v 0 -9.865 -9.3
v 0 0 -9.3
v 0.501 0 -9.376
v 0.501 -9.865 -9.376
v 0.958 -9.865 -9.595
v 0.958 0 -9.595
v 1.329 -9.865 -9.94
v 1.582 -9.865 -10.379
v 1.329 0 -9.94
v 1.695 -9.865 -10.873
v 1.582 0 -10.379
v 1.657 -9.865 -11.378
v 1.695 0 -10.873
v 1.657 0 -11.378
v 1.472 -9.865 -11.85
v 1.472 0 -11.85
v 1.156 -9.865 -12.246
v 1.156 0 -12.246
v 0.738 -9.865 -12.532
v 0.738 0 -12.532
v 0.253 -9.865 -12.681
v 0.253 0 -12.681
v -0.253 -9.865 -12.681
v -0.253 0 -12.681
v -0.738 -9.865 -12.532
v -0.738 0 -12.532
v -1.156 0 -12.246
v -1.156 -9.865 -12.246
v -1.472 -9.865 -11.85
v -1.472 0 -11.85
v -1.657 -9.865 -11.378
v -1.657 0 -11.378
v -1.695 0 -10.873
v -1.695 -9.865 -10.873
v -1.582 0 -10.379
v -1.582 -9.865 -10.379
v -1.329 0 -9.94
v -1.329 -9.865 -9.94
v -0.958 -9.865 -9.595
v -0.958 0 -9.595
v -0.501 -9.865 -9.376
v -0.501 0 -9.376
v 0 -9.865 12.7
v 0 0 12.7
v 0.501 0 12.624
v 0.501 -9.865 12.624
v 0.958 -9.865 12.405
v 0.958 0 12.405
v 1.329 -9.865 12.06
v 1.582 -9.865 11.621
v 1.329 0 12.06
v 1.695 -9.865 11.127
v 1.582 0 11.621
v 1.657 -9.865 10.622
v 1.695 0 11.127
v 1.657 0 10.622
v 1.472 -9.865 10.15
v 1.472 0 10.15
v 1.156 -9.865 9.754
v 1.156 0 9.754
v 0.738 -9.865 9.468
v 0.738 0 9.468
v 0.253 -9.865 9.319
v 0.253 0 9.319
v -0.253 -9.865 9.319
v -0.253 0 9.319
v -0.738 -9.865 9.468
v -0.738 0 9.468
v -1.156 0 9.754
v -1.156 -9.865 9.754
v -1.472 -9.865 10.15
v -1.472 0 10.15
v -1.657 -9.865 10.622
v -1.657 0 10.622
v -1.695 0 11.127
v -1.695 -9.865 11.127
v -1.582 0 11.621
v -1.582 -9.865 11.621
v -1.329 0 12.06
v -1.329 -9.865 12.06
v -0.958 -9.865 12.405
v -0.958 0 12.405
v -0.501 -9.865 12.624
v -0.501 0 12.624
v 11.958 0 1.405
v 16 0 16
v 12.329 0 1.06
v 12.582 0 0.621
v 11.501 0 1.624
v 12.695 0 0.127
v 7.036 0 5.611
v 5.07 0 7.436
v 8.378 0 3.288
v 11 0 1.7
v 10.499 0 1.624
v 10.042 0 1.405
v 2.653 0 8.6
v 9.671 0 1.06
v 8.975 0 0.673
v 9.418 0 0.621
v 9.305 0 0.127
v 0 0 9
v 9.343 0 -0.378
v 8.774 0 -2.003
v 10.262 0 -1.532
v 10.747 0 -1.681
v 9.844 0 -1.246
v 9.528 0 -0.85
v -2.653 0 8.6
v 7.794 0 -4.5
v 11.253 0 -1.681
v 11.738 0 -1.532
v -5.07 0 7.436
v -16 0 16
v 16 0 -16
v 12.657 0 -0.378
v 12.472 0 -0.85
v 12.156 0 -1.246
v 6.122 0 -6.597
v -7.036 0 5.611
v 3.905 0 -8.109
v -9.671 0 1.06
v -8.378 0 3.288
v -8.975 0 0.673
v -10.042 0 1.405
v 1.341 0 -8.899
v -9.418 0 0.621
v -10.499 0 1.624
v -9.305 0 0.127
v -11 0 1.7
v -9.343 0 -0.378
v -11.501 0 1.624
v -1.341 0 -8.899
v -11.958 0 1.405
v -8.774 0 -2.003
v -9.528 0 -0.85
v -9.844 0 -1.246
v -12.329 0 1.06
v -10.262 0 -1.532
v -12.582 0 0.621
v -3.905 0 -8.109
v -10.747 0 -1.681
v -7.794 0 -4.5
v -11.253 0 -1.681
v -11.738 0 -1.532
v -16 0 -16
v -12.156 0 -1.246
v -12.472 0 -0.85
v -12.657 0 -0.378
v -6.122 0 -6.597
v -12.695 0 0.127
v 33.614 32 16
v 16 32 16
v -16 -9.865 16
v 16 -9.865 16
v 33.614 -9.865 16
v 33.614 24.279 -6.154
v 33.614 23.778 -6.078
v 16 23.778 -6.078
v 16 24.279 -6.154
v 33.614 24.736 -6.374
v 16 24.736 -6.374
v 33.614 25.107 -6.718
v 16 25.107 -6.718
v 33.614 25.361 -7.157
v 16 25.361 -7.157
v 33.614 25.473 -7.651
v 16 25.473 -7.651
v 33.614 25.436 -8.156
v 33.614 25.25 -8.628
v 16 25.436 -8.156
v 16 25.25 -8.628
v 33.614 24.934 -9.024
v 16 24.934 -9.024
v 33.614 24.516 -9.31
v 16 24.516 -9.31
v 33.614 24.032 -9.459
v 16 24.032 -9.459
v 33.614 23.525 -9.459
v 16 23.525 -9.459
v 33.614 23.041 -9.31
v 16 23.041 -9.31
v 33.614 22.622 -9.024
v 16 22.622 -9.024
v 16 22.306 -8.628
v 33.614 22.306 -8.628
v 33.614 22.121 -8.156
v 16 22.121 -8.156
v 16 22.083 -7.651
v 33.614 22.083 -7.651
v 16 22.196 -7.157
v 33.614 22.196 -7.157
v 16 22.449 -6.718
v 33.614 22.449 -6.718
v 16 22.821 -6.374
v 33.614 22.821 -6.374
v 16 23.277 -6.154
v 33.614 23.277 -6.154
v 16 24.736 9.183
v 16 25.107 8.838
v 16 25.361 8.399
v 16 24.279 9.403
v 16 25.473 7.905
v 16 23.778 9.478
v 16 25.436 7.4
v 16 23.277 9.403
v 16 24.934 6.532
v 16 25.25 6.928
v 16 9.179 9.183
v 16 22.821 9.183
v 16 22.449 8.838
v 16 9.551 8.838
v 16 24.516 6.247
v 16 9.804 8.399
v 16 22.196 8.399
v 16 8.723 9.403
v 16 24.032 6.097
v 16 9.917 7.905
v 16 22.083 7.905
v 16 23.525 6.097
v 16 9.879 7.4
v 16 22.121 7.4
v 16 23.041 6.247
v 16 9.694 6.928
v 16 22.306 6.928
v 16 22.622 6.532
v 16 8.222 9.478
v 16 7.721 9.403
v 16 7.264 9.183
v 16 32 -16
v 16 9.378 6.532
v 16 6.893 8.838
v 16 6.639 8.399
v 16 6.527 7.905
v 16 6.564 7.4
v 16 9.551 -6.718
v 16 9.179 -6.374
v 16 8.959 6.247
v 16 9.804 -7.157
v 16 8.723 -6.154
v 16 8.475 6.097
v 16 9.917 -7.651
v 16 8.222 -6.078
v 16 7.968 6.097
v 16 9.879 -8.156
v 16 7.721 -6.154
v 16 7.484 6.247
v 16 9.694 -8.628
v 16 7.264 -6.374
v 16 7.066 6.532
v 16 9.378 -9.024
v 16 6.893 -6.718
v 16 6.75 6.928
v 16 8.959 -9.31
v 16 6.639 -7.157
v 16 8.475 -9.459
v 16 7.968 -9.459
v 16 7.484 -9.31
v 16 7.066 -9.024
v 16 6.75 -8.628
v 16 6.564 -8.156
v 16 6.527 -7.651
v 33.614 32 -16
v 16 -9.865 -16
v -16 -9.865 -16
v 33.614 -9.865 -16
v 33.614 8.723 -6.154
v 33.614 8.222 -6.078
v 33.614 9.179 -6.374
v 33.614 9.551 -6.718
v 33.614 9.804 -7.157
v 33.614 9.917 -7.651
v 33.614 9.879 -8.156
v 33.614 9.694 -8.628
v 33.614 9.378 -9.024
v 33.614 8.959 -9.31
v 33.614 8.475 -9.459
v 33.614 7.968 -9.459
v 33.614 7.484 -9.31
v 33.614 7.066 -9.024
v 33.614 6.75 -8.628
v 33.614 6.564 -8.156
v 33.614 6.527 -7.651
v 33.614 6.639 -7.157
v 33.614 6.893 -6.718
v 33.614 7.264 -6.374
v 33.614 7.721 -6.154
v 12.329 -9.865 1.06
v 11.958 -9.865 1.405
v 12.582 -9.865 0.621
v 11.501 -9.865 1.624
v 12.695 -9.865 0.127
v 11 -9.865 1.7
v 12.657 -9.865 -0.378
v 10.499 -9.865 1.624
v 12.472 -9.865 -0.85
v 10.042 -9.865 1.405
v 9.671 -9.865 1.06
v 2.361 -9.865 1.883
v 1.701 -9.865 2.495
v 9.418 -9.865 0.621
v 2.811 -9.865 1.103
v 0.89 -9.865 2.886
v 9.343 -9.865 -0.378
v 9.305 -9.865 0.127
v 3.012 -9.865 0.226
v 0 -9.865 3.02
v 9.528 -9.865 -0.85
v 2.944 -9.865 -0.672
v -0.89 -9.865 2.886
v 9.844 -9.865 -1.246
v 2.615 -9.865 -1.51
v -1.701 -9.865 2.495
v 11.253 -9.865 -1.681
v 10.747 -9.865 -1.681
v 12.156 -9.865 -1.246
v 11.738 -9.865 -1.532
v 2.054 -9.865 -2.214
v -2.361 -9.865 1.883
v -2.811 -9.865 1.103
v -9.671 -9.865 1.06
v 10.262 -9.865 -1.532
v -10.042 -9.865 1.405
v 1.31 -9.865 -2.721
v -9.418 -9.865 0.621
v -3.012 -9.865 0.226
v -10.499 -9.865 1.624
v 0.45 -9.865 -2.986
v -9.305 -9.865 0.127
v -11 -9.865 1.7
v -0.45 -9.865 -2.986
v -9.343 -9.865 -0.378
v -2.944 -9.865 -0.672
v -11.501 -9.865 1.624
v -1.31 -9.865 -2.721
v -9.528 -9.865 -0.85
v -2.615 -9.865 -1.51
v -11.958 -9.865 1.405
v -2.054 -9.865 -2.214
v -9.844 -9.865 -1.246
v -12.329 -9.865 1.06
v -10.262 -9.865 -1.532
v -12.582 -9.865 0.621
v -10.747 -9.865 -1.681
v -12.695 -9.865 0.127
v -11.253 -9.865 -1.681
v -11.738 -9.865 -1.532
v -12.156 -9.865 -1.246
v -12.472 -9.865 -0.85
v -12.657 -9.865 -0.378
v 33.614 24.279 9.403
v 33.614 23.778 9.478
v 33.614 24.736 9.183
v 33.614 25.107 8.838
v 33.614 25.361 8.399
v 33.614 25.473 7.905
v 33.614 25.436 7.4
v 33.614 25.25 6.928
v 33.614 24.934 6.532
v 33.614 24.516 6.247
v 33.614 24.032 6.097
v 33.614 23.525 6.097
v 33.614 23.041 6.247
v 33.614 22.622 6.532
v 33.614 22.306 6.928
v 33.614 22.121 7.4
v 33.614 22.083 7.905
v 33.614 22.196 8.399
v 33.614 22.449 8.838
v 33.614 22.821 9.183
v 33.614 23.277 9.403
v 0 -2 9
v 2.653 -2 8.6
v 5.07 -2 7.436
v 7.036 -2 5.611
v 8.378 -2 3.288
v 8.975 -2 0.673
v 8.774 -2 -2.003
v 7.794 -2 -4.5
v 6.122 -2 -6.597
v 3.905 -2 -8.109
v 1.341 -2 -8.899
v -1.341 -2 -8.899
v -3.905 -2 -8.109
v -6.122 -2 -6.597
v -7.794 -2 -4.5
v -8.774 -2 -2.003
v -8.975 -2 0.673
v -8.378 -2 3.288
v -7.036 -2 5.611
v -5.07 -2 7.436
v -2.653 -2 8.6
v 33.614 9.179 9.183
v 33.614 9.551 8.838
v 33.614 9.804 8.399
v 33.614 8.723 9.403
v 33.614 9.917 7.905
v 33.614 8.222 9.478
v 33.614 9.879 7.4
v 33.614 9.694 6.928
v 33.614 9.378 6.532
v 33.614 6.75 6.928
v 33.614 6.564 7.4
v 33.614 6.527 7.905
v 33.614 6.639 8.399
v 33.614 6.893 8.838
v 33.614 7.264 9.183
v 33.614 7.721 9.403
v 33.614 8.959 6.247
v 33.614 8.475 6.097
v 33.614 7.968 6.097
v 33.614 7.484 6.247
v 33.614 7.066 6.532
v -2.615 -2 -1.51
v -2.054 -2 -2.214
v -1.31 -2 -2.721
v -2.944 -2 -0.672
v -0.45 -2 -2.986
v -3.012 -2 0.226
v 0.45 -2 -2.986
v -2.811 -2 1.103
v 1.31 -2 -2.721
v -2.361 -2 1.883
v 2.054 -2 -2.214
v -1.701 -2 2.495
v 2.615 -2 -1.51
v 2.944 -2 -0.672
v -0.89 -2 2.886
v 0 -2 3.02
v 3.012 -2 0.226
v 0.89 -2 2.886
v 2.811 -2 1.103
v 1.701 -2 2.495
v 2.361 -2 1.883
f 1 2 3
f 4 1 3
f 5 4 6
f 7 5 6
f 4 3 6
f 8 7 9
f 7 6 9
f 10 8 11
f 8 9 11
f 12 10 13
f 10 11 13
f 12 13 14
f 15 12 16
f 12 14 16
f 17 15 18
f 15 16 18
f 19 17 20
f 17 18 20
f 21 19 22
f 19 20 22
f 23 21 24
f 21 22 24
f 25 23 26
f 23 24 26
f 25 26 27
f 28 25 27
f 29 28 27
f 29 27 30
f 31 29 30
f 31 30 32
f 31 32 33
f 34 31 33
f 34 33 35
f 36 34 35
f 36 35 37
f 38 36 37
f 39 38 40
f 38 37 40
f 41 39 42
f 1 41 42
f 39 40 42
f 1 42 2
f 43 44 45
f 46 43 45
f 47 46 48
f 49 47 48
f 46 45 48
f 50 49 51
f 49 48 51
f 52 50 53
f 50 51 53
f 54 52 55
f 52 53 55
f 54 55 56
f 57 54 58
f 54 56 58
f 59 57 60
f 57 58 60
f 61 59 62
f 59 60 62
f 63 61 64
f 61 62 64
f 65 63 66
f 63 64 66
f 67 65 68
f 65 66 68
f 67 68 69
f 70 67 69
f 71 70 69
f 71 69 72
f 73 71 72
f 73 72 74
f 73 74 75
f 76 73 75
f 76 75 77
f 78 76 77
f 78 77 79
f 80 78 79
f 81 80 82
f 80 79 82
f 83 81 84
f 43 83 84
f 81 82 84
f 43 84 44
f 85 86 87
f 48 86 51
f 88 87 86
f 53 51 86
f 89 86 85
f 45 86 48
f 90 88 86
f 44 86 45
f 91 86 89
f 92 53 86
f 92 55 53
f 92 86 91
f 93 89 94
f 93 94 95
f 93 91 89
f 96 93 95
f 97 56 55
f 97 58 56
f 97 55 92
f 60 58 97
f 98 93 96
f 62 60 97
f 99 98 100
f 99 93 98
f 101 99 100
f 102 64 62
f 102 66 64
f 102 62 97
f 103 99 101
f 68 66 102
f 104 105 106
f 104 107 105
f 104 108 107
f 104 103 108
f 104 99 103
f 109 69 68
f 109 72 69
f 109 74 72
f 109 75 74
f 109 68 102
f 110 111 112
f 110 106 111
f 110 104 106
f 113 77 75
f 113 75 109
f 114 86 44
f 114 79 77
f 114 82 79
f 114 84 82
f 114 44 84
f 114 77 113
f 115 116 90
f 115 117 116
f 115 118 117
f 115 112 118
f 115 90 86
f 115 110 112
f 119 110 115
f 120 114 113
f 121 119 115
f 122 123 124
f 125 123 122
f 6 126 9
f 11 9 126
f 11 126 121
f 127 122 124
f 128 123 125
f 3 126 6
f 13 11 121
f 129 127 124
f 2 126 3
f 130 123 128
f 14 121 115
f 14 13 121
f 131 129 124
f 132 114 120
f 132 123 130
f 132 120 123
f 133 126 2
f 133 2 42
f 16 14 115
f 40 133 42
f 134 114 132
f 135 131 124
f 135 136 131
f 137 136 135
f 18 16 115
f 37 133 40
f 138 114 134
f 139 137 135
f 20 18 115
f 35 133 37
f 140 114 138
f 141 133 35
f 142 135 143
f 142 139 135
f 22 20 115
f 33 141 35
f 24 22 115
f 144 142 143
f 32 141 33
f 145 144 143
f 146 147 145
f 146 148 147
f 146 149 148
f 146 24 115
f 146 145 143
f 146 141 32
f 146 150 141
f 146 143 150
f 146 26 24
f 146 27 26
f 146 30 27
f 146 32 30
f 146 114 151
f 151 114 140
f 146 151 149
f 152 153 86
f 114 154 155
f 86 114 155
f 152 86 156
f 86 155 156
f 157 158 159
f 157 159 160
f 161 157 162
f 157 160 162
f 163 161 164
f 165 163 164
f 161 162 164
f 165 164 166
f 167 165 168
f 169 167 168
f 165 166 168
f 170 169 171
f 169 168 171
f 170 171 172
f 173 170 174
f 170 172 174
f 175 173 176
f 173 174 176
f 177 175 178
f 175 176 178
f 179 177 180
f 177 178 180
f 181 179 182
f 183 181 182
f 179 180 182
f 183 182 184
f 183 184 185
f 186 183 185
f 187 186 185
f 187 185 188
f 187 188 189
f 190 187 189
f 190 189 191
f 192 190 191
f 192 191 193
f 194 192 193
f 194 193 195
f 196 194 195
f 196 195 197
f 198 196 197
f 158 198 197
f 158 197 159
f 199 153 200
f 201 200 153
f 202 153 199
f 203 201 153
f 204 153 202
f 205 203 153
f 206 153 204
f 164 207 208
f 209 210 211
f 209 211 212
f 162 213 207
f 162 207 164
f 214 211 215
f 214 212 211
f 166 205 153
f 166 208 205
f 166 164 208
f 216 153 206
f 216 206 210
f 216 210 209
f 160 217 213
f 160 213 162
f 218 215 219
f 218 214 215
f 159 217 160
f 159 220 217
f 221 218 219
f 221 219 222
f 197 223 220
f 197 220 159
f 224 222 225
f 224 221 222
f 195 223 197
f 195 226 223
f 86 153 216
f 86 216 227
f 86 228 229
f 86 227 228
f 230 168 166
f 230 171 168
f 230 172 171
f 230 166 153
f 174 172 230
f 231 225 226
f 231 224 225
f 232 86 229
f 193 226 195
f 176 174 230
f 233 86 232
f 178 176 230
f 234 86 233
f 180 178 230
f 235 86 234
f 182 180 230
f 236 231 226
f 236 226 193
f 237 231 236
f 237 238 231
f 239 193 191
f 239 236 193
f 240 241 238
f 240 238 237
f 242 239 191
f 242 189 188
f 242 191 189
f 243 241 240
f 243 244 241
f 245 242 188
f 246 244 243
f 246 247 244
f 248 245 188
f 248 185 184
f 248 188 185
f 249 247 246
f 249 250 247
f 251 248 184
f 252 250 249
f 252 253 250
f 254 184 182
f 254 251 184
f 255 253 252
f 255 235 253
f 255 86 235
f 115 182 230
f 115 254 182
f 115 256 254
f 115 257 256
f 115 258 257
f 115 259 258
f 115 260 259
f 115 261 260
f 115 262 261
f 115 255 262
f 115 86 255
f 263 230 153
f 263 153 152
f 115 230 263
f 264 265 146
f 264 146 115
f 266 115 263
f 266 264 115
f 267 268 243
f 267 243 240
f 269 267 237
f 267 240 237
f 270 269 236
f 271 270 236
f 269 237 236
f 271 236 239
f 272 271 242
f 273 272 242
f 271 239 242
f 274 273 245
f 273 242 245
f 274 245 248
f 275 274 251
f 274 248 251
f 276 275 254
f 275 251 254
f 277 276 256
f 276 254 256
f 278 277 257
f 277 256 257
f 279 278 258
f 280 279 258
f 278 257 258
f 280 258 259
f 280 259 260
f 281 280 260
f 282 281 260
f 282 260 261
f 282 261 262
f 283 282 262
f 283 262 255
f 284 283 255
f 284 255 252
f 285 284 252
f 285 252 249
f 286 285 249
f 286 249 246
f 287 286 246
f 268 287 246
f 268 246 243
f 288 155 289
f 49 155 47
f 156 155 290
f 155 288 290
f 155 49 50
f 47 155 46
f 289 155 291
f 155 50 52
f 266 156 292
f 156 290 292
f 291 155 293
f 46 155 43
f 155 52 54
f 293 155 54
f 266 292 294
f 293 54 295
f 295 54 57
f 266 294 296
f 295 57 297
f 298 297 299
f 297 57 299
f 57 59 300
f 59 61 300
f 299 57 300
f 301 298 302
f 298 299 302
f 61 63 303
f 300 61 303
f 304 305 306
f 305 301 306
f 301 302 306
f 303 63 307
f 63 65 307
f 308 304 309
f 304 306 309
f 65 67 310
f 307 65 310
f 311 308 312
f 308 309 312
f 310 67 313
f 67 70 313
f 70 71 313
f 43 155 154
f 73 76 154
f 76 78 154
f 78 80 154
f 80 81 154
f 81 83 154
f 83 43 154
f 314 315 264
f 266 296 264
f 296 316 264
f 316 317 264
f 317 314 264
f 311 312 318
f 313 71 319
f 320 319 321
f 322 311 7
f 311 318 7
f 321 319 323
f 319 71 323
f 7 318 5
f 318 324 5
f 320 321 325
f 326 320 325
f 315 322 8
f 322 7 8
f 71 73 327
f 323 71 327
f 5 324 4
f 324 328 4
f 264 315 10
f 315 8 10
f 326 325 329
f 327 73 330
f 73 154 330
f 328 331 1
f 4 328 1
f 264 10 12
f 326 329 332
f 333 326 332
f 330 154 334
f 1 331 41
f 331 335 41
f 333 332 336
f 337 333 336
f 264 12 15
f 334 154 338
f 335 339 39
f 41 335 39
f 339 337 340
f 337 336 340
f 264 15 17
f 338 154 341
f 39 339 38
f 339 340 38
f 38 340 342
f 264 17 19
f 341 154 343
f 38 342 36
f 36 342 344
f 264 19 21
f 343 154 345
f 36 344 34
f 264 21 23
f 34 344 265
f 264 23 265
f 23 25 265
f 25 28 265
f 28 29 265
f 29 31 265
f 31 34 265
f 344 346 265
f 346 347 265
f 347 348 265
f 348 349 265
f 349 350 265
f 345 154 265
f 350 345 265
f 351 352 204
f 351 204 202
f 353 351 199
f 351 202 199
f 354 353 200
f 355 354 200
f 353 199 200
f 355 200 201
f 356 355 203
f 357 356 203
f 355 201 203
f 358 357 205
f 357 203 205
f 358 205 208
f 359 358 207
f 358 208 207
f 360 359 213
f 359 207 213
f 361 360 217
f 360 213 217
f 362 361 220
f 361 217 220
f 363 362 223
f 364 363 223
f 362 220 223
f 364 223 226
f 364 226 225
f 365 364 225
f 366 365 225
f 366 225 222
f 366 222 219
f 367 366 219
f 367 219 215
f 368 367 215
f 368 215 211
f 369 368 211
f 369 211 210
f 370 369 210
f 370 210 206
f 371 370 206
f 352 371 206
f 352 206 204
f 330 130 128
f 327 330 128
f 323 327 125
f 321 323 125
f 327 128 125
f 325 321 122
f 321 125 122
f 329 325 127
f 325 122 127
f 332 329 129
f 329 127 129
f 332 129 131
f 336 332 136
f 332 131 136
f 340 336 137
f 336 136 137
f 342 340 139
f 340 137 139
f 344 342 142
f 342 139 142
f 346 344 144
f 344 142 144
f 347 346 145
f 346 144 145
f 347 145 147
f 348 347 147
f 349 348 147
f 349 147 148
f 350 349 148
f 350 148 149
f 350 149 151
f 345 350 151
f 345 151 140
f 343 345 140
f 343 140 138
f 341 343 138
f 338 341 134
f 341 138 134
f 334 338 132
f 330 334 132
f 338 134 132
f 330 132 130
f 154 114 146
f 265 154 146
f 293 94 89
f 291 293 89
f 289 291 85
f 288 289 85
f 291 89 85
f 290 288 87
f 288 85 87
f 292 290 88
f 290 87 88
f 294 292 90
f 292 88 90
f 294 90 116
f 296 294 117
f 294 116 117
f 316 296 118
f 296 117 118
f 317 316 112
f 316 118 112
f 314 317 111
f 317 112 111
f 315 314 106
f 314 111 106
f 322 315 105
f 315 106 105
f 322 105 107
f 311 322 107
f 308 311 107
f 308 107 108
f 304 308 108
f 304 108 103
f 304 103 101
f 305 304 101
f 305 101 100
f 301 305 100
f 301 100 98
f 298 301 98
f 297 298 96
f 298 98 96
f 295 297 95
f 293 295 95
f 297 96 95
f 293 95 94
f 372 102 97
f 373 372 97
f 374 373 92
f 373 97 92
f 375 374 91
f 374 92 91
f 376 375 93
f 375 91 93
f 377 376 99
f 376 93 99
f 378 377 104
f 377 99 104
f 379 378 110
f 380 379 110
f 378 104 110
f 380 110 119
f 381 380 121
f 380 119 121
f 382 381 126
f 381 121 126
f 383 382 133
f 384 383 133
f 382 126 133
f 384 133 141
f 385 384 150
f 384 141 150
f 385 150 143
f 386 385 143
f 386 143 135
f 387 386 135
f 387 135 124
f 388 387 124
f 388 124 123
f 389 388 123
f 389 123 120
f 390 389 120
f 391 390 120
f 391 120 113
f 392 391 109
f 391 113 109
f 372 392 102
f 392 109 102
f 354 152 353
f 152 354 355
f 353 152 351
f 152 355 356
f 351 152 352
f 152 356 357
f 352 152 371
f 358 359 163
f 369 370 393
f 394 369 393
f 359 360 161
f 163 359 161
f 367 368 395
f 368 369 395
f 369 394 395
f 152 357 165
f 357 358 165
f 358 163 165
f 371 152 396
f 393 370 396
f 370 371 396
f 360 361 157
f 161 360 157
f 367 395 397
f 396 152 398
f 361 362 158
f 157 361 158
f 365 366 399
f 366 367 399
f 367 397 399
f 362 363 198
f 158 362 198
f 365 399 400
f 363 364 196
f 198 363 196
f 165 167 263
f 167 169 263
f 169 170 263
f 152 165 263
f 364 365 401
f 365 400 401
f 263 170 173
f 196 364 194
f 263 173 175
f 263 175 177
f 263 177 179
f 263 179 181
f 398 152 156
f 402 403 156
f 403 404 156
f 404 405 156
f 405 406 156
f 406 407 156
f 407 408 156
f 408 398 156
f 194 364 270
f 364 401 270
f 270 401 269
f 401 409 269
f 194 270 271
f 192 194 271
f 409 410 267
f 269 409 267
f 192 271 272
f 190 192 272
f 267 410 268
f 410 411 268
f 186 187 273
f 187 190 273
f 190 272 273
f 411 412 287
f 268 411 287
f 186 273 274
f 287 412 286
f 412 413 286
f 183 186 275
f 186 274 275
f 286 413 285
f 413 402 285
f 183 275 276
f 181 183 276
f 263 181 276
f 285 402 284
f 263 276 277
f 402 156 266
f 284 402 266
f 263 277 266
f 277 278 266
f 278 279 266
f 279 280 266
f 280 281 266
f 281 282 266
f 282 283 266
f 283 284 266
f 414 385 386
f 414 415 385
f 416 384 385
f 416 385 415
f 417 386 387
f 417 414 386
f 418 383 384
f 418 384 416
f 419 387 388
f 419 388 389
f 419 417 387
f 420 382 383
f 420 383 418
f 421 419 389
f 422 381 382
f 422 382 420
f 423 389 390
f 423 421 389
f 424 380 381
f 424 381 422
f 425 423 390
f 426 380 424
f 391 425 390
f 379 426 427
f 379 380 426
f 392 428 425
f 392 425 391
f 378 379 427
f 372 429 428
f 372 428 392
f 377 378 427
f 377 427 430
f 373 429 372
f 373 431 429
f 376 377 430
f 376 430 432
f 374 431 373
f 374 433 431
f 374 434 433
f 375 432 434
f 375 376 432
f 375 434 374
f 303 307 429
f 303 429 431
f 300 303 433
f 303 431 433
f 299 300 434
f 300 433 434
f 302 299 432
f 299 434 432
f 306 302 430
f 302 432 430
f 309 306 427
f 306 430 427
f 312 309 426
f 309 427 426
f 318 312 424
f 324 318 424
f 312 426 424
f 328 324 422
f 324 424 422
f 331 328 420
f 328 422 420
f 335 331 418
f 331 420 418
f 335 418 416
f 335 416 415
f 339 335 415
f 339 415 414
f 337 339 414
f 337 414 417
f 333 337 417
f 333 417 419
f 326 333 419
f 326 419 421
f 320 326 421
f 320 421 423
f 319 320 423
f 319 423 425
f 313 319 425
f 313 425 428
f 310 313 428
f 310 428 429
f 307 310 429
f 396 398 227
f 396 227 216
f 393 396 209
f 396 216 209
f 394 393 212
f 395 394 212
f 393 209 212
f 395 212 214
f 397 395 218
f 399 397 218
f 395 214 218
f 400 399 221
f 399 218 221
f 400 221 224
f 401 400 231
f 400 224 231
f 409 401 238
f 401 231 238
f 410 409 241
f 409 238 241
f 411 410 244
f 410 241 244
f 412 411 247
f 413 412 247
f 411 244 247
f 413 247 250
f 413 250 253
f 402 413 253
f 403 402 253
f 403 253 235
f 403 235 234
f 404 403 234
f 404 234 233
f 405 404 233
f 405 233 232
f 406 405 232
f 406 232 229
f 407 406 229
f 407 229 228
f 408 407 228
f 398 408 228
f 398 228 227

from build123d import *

# Parameters (mm, degrees)
SKETCH1_W           = 32
SKETCH1_H           = 32
SKETCH1_R           = 1.7
SKETCH1_R_2         = 3.02
BOSS_EXTRUDE1_DEPTH = 9.864848297
SKETCH1_5_R         = 9
CUT_EXTRUDE2_DEPTH  = 2
SKETCH7_W           = 32
SKETCH7_H           = 9.864848297
BOSS_EXTRUDE3_DEPTH = 17.613942208
SKETCH10_W          = 17.613942208
SKETCH10_H          = 32
BOSS_EXTRUDE5_DEPTH = 32
SKETCH11_R          = 1.7
CUT_EXTRUDE3_DEPTH  = 49


with BuildPart() as part:
    # Sketch1 → Boss-Extrude1 (new body)
    with BuildSketch(Plane(origin=(0, 0, 0), x_dir=(1, 0, 0), z_dir=(0, 1, 0))):
        Rectangle(SKETCH1_W, SKETCH1_H)
        with Locations((0, 11)):
            Circle(SKETCH1_R, mode=Mode.SUBTRACT)
        with Locations((-11, 0)):
            Circle(SKETCH1_R, mode=Mode.SUBTRACT)
        with Locations((0, -11)):
            Circle(SKETCH1_R, mode=Mode.SUBTRACT)
        with Locations((11, 0)):
            Circle(SKETCH1_R, mode=Mode.SUBTRACT)
        Circle(SKETCH1_R_2, mode=Mode.SUBTRACT)
    extrude(amount=-BOSS_EXTRUDE1_DEPTH)

    # Sketch1<5> → Cut-Extrude2 (cut)
    with BuildSketch(Plane(origin=(0, 0, 0), x_dir=(1, 0, 0), z_dir=(0, 1, 0))):
        Circle(SKETCH1_5_R)
    extrude(amount=-CUT_EXTRUDE2_DEPTH, mode=Mode.SUBTRACT)

    # Sketch7 → Boss-Extrude3 (add)
    with BuildSketch(Plane(origin=(16, 0, 0), x_dir=(0, 0, -1), z_dir=(1, 0, 0))):
        with Locations((0, -4.932424148)):
            Rectangle(SKETCH7_W, SKETCH7_H)
    extrude(amount=BOSS_EXTRUDE3_DEPTH)

    # Sketch10 → Boss-Extrude5 (add)
    with BuildSketch(Plane(origin=(0, 0, 0), x_dir=(1, 0, 0), z_dir=(0, 1, 0))):
        with Locations((24.806971104, 0)):
            Rectangle(SKETCH10_W, SKETCH10_H)
    extrude(amount=BOSS_EXTRUDE5_DEPTH)

    # Sketch11 → Cut-Extrude3 (cut, through all)
    with BuildSketch(Plane.ZY.offset(-16)):
        with Locations((-7.778174593, 23.778174593)):
            Circle(SKETCH11_R)
        with Locations((7.778174593, 23.778174593)):
            Circle(SKETCH11_R)
        with Locations((7.778174593, 8.221825407)):
            Circle(SKETCH11_R)
        with Locations((-7.778174593, 8.221825407)):
            Circle(SKETCH11_R)
    extrude(amount=-CUT_EXTRUDE3_DEPTH, mode=Mode.SUBTRACT)


solid = part.part
